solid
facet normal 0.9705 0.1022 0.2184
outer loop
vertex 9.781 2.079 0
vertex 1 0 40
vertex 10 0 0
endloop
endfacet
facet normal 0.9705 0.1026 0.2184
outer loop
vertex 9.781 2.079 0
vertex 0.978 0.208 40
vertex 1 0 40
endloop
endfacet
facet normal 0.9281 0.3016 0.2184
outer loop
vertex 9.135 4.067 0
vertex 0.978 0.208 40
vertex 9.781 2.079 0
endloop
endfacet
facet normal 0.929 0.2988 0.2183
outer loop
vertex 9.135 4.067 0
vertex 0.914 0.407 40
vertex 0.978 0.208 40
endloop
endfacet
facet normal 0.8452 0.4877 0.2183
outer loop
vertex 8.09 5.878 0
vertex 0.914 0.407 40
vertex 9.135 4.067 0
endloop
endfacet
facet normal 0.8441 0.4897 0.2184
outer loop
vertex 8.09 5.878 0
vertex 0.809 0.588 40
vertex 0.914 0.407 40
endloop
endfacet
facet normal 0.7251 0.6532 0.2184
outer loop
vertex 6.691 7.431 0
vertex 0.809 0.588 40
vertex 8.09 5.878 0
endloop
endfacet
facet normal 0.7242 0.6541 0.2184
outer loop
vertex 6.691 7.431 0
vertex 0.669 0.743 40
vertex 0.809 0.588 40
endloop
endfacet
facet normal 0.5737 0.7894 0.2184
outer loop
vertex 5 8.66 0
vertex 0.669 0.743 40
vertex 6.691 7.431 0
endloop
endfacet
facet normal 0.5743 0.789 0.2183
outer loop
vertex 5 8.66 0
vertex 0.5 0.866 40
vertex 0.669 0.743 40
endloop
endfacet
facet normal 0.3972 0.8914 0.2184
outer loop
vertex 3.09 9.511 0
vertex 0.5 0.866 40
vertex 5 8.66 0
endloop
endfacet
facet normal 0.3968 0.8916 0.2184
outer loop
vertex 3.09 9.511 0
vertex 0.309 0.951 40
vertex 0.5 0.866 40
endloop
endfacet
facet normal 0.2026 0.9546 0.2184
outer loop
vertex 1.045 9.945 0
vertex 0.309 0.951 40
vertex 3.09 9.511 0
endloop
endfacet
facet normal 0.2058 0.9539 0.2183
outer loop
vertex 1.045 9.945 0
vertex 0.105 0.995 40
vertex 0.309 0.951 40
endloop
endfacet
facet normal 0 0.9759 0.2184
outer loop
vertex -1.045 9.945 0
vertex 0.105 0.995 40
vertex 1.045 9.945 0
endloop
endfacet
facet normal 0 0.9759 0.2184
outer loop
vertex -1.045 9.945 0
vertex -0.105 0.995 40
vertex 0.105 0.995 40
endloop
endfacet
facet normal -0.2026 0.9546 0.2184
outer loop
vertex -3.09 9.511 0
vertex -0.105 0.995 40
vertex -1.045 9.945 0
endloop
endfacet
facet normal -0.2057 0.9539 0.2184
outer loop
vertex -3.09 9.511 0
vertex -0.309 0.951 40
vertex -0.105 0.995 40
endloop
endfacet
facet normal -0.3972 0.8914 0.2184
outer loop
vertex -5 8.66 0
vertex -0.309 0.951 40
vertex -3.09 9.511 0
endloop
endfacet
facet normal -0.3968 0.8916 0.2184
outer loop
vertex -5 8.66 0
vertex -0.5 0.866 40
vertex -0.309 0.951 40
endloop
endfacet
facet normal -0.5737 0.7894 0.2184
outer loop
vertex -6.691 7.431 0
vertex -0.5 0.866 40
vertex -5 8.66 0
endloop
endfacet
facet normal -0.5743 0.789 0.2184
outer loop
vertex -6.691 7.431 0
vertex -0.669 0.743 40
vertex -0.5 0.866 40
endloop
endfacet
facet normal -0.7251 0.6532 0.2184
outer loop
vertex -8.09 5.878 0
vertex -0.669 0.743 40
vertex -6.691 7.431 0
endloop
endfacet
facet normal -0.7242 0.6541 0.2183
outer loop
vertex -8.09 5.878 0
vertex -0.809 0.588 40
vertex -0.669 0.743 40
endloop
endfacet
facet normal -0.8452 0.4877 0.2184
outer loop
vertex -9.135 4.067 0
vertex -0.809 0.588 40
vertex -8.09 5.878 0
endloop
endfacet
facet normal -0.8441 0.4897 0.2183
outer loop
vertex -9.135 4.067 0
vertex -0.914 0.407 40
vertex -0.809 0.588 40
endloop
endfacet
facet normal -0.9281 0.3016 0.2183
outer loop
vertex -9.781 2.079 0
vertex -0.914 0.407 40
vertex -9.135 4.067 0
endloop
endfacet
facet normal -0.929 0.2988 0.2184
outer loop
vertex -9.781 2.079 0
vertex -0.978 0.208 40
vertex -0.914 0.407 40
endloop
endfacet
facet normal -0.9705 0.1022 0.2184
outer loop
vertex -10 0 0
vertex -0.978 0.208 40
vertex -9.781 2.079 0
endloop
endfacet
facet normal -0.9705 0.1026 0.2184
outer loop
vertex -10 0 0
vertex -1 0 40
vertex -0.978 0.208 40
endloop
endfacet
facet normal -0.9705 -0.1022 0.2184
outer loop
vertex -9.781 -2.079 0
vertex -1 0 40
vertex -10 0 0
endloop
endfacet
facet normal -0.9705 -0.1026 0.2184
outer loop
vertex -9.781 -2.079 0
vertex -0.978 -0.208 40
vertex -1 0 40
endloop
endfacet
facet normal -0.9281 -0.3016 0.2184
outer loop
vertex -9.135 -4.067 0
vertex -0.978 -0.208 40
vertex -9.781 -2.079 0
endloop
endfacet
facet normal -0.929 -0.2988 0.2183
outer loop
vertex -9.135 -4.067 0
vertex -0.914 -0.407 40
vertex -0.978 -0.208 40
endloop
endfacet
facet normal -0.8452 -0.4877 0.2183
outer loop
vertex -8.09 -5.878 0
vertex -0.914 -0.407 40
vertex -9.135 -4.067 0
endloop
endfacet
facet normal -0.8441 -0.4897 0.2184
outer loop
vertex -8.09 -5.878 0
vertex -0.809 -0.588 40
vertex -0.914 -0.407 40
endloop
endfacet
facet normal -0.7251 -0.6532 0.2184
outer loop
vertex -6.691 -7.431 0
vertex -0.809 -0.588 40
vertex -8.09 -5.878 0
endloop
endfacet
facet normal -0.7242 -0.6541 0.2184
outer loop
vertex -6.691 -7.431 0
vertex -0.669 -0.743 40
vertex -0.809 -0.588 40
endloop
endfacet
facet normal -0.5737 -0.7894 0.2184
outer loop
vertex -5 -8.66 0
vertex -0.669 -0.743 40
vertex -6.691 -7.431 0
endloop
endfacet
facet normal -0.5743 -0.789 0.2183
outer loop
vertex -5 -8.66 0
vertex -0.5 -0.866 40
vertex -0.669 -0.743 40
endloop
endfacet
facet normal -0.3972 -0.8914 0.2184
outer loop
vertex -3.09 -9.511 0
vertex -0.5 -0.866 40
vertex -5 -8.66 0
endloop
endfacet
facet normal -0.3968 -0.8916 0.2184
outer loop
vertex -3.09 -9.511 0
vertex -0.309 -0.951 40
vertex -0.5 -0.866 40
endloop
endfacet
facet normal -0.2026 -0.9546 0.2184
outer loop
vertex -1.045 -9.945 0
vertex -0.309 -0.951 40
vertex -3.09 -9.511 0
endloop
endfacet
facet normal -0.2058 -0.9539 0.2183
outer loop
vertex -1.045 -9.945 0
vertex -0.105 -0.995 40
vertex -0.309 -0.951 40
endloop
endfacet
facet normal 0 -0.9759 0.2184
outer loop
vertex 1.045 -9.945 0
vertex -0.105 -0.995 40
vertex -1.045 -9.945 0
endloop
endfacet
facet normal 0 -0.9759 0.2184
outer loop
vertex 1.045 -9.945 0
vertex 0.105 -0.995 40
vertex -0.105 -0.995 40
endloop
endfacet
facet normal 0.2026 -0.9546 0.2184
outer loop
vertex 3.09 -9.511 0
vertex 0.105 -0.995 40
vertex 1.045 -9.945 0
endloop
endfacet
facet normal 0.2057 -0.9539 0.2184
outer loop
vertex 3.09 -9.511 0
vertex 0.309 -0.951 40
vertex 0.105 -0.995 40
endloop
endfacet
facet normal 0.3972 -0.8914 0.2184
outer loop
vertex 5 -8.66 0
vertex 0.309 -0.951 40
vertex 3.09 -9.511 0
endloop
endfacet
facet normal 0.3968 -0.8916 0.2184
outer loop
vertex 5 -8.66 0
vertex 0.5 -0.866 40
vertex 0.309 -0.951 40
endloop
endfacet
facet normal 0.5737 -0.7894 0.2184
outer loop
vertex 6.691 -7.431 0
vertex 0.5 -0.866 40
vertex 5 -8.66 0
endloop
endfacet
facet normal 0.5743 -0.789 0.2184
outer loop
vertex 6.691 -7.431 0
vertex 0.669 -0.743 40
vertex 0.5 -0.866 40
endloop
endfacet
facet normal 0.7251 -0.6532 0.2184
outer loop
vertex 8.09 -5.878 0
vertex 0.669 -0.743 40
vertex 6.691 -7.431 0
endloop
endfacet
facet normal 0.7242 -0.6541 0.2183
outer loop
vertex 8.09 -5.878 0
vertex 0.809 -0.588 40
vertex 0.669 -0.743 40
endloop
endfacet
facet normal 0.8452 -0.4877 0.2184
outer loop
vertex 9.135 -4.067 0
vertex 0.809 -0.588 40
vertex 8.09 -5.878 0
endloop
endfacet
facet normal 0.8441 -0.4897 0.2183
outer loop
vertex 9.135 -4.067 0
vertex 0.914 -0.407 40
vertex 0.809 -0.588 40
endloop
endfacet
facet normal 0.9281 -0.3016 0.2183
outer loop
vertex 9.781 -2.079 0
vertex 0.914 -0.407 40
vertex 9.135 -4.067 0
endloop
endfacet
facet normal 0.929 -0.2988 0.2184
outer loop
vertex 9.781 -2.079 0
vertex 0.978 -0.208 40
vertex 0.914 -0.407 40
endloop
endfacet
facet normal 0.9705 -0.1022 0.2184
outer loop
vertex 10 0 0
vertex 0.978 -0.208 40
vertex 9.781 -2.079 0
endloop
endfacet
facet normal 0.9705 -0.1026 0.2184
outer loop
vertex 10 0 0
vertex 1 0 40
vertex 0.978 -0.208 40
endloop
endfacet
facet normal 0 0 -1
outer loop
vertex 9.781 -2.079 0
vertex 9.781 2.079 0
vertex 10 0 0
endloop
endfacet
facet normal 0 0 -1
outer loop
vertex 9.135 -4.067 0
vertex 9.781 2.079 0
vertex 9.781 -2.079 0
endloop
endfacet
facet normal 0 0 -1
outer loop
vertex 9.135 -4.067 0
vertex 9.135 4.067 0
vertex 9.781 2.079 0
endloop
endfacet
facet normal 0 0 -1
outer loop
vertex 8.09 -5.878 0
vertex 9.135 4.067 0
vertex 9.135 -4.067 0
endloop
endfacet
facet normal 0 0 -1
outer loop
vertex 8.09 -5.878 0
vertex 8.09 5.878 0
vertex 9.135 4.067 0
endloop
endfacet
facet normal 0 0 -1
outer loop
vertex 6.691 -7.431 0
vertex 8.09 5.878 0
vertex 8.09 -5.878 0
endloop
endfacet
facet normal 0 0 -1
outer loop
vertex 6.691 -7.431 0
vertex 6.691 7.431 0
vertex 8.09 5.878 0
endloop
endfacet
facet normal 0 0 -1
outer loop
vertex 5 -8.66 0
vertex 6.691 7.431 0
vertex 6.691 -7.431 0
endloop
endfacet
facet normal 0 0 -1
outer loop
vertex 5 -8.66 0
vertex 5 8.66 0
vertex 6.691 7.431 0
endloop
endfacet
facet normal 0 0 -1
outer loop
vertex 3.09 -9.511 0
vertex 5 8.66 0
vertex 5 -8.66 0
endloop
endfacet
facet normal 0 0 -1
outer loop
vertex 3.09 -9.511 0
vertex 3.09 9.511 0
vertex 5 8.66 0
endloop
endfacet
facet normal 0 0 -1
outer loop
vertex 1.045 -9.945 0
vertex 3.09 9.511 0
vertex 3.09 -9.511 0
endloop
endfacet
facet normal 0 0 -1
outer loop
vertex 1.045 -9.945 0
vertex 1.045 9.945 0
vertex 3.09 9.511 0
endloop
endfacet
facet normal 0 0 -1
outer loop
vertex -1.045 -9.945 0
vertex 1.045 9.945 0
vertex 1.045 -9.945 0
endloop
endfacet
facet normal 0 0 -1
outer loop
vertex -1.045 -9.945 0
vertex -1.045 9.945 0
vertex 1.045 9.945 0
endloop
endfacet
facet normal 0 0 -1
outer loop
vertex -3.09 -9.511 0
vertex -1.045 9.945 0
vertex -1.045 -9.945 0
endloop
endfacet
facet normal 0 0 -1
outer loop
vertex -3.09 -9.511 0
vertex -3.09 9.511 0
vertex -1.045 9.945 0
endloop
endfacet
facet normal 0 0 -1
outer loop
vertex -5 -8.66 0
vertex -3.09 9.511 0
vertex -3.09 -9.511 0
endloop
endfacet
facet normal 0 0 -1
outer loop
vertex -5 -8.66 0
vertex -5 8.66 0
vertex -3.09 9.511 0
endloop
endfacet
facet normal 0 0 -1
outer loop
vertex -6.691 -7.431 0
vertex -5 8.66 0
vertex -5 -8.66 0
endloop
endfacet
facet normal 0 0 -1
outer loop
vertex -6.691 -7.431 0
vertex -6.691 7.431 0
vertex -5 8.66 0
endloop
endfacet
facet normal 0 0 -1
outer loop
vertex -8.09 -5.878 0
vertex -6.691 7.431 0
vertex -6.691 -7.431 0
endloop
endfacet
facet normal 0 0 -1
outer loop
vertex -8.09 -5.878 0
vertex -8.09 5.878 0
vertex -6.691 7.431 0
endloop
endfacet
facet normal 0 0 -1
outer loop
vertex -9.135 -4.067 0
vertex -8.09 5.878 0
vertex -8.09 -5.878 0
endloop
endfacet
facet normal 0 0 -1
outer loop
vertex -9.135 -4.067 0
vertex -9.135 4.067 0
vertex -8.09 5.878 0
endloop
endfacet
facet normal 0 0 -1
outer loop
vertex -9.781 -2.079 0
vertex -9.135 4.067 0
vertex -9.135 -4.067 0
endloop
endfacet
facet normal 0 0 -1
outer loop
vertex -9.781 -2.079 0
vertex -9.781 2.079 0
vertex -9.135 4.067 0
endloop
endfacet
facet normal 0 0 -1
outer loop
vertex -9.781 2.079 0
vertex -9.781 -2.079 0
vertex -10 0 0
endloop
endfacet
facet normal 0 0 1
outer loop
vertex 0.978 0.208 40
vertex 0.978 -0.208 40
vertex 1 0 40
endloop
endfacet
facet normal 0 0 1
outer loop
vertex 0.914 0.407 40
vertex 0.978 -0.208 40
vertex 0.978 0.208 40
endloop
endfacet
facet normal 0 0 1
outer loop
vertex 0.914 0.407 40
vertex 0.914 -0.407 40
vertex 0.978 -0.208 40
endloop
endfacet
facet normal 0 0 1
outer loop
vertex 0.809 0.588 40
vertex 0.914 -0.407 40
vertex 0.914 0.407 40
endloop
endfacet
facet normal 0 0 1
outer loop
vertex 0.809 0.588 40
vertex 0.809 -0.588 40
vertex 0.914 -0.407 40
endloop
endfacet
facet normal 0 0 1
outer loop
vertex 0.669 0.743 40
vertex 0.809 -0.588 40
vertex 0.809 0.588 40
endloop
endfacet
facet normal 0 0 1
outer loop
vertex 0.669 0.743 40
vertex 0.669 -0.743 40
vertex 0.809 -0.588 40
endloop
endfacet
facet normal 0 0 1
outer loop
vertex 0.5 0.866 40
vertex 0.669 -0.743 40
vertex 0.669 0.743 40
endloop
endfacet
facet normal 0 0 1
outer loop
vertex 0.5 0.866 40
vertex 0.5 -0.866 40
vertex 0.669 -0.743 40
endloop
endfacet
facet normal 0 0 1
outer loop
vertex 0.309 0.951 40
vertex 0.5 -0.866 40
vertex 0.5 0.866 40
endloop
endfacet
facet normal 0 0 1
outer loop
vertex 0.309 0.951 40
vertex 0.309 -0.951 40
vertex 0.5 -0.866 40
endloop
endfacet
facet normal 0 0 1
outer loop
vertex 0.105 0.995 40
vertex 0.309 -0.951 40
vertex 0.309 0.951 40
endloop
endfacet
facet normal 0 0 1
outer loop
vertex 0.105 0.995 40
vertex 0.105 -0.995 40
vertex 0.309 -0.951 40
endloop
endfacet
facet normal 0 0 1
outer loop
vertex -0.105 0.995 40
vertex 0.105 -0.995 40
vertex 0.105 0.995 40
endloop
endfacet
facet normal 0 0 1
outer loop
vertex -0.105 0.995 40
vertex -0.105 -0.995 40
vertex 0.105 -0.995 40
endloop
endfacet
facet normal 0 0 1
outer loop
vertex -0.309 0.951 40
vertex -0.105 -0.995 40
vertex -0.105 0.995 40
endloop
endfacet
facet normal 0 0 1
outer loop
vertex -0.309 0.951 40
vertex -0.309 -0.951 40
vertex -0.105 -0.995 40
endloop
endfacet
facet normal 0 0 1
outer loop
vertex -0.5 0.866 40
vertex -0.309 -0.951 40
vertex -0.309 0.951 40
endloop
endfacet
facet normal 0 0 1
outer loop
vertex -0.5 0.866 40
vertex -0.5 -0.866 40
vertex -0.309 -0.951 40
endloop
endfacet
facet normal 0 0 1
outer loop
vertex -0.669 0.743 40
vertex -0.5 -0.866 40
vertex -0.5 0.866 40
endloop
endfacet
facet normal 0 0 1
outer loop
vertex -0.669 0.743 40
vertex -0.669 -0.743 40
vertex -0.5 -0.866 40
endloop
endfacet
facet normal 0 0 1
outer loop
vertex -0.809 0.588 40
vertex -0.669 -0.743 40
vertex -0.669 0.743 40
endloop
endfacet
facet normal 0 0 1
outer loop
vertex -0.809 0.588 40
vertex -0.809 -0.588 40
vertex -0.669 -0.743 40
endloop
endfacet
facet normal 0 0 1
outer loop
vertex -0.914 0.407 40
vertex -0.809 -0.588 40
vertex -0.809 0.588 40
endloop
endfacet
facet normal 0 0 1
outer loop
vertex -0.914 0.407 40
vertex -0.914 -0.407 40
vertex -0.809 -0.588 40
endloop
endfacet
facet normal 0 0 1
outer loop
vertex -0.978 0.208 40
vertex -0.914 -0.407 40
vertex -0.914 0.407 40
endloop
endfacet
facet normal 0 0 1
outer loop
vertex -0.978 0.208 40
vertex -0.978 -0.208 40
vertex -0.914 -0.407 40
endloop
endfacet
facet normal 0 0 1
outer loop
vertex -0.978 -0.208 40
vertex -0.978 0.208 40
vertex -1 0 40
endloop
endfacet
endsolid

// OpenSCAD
/*
    House of Duckings
    Parts to turn ducks into dragons.
*/

BASE = 10;
POINT = 1;
HEIGHT = 40;

cylinder(r1=BASE,r2=POINT,h=HEIGHT);
